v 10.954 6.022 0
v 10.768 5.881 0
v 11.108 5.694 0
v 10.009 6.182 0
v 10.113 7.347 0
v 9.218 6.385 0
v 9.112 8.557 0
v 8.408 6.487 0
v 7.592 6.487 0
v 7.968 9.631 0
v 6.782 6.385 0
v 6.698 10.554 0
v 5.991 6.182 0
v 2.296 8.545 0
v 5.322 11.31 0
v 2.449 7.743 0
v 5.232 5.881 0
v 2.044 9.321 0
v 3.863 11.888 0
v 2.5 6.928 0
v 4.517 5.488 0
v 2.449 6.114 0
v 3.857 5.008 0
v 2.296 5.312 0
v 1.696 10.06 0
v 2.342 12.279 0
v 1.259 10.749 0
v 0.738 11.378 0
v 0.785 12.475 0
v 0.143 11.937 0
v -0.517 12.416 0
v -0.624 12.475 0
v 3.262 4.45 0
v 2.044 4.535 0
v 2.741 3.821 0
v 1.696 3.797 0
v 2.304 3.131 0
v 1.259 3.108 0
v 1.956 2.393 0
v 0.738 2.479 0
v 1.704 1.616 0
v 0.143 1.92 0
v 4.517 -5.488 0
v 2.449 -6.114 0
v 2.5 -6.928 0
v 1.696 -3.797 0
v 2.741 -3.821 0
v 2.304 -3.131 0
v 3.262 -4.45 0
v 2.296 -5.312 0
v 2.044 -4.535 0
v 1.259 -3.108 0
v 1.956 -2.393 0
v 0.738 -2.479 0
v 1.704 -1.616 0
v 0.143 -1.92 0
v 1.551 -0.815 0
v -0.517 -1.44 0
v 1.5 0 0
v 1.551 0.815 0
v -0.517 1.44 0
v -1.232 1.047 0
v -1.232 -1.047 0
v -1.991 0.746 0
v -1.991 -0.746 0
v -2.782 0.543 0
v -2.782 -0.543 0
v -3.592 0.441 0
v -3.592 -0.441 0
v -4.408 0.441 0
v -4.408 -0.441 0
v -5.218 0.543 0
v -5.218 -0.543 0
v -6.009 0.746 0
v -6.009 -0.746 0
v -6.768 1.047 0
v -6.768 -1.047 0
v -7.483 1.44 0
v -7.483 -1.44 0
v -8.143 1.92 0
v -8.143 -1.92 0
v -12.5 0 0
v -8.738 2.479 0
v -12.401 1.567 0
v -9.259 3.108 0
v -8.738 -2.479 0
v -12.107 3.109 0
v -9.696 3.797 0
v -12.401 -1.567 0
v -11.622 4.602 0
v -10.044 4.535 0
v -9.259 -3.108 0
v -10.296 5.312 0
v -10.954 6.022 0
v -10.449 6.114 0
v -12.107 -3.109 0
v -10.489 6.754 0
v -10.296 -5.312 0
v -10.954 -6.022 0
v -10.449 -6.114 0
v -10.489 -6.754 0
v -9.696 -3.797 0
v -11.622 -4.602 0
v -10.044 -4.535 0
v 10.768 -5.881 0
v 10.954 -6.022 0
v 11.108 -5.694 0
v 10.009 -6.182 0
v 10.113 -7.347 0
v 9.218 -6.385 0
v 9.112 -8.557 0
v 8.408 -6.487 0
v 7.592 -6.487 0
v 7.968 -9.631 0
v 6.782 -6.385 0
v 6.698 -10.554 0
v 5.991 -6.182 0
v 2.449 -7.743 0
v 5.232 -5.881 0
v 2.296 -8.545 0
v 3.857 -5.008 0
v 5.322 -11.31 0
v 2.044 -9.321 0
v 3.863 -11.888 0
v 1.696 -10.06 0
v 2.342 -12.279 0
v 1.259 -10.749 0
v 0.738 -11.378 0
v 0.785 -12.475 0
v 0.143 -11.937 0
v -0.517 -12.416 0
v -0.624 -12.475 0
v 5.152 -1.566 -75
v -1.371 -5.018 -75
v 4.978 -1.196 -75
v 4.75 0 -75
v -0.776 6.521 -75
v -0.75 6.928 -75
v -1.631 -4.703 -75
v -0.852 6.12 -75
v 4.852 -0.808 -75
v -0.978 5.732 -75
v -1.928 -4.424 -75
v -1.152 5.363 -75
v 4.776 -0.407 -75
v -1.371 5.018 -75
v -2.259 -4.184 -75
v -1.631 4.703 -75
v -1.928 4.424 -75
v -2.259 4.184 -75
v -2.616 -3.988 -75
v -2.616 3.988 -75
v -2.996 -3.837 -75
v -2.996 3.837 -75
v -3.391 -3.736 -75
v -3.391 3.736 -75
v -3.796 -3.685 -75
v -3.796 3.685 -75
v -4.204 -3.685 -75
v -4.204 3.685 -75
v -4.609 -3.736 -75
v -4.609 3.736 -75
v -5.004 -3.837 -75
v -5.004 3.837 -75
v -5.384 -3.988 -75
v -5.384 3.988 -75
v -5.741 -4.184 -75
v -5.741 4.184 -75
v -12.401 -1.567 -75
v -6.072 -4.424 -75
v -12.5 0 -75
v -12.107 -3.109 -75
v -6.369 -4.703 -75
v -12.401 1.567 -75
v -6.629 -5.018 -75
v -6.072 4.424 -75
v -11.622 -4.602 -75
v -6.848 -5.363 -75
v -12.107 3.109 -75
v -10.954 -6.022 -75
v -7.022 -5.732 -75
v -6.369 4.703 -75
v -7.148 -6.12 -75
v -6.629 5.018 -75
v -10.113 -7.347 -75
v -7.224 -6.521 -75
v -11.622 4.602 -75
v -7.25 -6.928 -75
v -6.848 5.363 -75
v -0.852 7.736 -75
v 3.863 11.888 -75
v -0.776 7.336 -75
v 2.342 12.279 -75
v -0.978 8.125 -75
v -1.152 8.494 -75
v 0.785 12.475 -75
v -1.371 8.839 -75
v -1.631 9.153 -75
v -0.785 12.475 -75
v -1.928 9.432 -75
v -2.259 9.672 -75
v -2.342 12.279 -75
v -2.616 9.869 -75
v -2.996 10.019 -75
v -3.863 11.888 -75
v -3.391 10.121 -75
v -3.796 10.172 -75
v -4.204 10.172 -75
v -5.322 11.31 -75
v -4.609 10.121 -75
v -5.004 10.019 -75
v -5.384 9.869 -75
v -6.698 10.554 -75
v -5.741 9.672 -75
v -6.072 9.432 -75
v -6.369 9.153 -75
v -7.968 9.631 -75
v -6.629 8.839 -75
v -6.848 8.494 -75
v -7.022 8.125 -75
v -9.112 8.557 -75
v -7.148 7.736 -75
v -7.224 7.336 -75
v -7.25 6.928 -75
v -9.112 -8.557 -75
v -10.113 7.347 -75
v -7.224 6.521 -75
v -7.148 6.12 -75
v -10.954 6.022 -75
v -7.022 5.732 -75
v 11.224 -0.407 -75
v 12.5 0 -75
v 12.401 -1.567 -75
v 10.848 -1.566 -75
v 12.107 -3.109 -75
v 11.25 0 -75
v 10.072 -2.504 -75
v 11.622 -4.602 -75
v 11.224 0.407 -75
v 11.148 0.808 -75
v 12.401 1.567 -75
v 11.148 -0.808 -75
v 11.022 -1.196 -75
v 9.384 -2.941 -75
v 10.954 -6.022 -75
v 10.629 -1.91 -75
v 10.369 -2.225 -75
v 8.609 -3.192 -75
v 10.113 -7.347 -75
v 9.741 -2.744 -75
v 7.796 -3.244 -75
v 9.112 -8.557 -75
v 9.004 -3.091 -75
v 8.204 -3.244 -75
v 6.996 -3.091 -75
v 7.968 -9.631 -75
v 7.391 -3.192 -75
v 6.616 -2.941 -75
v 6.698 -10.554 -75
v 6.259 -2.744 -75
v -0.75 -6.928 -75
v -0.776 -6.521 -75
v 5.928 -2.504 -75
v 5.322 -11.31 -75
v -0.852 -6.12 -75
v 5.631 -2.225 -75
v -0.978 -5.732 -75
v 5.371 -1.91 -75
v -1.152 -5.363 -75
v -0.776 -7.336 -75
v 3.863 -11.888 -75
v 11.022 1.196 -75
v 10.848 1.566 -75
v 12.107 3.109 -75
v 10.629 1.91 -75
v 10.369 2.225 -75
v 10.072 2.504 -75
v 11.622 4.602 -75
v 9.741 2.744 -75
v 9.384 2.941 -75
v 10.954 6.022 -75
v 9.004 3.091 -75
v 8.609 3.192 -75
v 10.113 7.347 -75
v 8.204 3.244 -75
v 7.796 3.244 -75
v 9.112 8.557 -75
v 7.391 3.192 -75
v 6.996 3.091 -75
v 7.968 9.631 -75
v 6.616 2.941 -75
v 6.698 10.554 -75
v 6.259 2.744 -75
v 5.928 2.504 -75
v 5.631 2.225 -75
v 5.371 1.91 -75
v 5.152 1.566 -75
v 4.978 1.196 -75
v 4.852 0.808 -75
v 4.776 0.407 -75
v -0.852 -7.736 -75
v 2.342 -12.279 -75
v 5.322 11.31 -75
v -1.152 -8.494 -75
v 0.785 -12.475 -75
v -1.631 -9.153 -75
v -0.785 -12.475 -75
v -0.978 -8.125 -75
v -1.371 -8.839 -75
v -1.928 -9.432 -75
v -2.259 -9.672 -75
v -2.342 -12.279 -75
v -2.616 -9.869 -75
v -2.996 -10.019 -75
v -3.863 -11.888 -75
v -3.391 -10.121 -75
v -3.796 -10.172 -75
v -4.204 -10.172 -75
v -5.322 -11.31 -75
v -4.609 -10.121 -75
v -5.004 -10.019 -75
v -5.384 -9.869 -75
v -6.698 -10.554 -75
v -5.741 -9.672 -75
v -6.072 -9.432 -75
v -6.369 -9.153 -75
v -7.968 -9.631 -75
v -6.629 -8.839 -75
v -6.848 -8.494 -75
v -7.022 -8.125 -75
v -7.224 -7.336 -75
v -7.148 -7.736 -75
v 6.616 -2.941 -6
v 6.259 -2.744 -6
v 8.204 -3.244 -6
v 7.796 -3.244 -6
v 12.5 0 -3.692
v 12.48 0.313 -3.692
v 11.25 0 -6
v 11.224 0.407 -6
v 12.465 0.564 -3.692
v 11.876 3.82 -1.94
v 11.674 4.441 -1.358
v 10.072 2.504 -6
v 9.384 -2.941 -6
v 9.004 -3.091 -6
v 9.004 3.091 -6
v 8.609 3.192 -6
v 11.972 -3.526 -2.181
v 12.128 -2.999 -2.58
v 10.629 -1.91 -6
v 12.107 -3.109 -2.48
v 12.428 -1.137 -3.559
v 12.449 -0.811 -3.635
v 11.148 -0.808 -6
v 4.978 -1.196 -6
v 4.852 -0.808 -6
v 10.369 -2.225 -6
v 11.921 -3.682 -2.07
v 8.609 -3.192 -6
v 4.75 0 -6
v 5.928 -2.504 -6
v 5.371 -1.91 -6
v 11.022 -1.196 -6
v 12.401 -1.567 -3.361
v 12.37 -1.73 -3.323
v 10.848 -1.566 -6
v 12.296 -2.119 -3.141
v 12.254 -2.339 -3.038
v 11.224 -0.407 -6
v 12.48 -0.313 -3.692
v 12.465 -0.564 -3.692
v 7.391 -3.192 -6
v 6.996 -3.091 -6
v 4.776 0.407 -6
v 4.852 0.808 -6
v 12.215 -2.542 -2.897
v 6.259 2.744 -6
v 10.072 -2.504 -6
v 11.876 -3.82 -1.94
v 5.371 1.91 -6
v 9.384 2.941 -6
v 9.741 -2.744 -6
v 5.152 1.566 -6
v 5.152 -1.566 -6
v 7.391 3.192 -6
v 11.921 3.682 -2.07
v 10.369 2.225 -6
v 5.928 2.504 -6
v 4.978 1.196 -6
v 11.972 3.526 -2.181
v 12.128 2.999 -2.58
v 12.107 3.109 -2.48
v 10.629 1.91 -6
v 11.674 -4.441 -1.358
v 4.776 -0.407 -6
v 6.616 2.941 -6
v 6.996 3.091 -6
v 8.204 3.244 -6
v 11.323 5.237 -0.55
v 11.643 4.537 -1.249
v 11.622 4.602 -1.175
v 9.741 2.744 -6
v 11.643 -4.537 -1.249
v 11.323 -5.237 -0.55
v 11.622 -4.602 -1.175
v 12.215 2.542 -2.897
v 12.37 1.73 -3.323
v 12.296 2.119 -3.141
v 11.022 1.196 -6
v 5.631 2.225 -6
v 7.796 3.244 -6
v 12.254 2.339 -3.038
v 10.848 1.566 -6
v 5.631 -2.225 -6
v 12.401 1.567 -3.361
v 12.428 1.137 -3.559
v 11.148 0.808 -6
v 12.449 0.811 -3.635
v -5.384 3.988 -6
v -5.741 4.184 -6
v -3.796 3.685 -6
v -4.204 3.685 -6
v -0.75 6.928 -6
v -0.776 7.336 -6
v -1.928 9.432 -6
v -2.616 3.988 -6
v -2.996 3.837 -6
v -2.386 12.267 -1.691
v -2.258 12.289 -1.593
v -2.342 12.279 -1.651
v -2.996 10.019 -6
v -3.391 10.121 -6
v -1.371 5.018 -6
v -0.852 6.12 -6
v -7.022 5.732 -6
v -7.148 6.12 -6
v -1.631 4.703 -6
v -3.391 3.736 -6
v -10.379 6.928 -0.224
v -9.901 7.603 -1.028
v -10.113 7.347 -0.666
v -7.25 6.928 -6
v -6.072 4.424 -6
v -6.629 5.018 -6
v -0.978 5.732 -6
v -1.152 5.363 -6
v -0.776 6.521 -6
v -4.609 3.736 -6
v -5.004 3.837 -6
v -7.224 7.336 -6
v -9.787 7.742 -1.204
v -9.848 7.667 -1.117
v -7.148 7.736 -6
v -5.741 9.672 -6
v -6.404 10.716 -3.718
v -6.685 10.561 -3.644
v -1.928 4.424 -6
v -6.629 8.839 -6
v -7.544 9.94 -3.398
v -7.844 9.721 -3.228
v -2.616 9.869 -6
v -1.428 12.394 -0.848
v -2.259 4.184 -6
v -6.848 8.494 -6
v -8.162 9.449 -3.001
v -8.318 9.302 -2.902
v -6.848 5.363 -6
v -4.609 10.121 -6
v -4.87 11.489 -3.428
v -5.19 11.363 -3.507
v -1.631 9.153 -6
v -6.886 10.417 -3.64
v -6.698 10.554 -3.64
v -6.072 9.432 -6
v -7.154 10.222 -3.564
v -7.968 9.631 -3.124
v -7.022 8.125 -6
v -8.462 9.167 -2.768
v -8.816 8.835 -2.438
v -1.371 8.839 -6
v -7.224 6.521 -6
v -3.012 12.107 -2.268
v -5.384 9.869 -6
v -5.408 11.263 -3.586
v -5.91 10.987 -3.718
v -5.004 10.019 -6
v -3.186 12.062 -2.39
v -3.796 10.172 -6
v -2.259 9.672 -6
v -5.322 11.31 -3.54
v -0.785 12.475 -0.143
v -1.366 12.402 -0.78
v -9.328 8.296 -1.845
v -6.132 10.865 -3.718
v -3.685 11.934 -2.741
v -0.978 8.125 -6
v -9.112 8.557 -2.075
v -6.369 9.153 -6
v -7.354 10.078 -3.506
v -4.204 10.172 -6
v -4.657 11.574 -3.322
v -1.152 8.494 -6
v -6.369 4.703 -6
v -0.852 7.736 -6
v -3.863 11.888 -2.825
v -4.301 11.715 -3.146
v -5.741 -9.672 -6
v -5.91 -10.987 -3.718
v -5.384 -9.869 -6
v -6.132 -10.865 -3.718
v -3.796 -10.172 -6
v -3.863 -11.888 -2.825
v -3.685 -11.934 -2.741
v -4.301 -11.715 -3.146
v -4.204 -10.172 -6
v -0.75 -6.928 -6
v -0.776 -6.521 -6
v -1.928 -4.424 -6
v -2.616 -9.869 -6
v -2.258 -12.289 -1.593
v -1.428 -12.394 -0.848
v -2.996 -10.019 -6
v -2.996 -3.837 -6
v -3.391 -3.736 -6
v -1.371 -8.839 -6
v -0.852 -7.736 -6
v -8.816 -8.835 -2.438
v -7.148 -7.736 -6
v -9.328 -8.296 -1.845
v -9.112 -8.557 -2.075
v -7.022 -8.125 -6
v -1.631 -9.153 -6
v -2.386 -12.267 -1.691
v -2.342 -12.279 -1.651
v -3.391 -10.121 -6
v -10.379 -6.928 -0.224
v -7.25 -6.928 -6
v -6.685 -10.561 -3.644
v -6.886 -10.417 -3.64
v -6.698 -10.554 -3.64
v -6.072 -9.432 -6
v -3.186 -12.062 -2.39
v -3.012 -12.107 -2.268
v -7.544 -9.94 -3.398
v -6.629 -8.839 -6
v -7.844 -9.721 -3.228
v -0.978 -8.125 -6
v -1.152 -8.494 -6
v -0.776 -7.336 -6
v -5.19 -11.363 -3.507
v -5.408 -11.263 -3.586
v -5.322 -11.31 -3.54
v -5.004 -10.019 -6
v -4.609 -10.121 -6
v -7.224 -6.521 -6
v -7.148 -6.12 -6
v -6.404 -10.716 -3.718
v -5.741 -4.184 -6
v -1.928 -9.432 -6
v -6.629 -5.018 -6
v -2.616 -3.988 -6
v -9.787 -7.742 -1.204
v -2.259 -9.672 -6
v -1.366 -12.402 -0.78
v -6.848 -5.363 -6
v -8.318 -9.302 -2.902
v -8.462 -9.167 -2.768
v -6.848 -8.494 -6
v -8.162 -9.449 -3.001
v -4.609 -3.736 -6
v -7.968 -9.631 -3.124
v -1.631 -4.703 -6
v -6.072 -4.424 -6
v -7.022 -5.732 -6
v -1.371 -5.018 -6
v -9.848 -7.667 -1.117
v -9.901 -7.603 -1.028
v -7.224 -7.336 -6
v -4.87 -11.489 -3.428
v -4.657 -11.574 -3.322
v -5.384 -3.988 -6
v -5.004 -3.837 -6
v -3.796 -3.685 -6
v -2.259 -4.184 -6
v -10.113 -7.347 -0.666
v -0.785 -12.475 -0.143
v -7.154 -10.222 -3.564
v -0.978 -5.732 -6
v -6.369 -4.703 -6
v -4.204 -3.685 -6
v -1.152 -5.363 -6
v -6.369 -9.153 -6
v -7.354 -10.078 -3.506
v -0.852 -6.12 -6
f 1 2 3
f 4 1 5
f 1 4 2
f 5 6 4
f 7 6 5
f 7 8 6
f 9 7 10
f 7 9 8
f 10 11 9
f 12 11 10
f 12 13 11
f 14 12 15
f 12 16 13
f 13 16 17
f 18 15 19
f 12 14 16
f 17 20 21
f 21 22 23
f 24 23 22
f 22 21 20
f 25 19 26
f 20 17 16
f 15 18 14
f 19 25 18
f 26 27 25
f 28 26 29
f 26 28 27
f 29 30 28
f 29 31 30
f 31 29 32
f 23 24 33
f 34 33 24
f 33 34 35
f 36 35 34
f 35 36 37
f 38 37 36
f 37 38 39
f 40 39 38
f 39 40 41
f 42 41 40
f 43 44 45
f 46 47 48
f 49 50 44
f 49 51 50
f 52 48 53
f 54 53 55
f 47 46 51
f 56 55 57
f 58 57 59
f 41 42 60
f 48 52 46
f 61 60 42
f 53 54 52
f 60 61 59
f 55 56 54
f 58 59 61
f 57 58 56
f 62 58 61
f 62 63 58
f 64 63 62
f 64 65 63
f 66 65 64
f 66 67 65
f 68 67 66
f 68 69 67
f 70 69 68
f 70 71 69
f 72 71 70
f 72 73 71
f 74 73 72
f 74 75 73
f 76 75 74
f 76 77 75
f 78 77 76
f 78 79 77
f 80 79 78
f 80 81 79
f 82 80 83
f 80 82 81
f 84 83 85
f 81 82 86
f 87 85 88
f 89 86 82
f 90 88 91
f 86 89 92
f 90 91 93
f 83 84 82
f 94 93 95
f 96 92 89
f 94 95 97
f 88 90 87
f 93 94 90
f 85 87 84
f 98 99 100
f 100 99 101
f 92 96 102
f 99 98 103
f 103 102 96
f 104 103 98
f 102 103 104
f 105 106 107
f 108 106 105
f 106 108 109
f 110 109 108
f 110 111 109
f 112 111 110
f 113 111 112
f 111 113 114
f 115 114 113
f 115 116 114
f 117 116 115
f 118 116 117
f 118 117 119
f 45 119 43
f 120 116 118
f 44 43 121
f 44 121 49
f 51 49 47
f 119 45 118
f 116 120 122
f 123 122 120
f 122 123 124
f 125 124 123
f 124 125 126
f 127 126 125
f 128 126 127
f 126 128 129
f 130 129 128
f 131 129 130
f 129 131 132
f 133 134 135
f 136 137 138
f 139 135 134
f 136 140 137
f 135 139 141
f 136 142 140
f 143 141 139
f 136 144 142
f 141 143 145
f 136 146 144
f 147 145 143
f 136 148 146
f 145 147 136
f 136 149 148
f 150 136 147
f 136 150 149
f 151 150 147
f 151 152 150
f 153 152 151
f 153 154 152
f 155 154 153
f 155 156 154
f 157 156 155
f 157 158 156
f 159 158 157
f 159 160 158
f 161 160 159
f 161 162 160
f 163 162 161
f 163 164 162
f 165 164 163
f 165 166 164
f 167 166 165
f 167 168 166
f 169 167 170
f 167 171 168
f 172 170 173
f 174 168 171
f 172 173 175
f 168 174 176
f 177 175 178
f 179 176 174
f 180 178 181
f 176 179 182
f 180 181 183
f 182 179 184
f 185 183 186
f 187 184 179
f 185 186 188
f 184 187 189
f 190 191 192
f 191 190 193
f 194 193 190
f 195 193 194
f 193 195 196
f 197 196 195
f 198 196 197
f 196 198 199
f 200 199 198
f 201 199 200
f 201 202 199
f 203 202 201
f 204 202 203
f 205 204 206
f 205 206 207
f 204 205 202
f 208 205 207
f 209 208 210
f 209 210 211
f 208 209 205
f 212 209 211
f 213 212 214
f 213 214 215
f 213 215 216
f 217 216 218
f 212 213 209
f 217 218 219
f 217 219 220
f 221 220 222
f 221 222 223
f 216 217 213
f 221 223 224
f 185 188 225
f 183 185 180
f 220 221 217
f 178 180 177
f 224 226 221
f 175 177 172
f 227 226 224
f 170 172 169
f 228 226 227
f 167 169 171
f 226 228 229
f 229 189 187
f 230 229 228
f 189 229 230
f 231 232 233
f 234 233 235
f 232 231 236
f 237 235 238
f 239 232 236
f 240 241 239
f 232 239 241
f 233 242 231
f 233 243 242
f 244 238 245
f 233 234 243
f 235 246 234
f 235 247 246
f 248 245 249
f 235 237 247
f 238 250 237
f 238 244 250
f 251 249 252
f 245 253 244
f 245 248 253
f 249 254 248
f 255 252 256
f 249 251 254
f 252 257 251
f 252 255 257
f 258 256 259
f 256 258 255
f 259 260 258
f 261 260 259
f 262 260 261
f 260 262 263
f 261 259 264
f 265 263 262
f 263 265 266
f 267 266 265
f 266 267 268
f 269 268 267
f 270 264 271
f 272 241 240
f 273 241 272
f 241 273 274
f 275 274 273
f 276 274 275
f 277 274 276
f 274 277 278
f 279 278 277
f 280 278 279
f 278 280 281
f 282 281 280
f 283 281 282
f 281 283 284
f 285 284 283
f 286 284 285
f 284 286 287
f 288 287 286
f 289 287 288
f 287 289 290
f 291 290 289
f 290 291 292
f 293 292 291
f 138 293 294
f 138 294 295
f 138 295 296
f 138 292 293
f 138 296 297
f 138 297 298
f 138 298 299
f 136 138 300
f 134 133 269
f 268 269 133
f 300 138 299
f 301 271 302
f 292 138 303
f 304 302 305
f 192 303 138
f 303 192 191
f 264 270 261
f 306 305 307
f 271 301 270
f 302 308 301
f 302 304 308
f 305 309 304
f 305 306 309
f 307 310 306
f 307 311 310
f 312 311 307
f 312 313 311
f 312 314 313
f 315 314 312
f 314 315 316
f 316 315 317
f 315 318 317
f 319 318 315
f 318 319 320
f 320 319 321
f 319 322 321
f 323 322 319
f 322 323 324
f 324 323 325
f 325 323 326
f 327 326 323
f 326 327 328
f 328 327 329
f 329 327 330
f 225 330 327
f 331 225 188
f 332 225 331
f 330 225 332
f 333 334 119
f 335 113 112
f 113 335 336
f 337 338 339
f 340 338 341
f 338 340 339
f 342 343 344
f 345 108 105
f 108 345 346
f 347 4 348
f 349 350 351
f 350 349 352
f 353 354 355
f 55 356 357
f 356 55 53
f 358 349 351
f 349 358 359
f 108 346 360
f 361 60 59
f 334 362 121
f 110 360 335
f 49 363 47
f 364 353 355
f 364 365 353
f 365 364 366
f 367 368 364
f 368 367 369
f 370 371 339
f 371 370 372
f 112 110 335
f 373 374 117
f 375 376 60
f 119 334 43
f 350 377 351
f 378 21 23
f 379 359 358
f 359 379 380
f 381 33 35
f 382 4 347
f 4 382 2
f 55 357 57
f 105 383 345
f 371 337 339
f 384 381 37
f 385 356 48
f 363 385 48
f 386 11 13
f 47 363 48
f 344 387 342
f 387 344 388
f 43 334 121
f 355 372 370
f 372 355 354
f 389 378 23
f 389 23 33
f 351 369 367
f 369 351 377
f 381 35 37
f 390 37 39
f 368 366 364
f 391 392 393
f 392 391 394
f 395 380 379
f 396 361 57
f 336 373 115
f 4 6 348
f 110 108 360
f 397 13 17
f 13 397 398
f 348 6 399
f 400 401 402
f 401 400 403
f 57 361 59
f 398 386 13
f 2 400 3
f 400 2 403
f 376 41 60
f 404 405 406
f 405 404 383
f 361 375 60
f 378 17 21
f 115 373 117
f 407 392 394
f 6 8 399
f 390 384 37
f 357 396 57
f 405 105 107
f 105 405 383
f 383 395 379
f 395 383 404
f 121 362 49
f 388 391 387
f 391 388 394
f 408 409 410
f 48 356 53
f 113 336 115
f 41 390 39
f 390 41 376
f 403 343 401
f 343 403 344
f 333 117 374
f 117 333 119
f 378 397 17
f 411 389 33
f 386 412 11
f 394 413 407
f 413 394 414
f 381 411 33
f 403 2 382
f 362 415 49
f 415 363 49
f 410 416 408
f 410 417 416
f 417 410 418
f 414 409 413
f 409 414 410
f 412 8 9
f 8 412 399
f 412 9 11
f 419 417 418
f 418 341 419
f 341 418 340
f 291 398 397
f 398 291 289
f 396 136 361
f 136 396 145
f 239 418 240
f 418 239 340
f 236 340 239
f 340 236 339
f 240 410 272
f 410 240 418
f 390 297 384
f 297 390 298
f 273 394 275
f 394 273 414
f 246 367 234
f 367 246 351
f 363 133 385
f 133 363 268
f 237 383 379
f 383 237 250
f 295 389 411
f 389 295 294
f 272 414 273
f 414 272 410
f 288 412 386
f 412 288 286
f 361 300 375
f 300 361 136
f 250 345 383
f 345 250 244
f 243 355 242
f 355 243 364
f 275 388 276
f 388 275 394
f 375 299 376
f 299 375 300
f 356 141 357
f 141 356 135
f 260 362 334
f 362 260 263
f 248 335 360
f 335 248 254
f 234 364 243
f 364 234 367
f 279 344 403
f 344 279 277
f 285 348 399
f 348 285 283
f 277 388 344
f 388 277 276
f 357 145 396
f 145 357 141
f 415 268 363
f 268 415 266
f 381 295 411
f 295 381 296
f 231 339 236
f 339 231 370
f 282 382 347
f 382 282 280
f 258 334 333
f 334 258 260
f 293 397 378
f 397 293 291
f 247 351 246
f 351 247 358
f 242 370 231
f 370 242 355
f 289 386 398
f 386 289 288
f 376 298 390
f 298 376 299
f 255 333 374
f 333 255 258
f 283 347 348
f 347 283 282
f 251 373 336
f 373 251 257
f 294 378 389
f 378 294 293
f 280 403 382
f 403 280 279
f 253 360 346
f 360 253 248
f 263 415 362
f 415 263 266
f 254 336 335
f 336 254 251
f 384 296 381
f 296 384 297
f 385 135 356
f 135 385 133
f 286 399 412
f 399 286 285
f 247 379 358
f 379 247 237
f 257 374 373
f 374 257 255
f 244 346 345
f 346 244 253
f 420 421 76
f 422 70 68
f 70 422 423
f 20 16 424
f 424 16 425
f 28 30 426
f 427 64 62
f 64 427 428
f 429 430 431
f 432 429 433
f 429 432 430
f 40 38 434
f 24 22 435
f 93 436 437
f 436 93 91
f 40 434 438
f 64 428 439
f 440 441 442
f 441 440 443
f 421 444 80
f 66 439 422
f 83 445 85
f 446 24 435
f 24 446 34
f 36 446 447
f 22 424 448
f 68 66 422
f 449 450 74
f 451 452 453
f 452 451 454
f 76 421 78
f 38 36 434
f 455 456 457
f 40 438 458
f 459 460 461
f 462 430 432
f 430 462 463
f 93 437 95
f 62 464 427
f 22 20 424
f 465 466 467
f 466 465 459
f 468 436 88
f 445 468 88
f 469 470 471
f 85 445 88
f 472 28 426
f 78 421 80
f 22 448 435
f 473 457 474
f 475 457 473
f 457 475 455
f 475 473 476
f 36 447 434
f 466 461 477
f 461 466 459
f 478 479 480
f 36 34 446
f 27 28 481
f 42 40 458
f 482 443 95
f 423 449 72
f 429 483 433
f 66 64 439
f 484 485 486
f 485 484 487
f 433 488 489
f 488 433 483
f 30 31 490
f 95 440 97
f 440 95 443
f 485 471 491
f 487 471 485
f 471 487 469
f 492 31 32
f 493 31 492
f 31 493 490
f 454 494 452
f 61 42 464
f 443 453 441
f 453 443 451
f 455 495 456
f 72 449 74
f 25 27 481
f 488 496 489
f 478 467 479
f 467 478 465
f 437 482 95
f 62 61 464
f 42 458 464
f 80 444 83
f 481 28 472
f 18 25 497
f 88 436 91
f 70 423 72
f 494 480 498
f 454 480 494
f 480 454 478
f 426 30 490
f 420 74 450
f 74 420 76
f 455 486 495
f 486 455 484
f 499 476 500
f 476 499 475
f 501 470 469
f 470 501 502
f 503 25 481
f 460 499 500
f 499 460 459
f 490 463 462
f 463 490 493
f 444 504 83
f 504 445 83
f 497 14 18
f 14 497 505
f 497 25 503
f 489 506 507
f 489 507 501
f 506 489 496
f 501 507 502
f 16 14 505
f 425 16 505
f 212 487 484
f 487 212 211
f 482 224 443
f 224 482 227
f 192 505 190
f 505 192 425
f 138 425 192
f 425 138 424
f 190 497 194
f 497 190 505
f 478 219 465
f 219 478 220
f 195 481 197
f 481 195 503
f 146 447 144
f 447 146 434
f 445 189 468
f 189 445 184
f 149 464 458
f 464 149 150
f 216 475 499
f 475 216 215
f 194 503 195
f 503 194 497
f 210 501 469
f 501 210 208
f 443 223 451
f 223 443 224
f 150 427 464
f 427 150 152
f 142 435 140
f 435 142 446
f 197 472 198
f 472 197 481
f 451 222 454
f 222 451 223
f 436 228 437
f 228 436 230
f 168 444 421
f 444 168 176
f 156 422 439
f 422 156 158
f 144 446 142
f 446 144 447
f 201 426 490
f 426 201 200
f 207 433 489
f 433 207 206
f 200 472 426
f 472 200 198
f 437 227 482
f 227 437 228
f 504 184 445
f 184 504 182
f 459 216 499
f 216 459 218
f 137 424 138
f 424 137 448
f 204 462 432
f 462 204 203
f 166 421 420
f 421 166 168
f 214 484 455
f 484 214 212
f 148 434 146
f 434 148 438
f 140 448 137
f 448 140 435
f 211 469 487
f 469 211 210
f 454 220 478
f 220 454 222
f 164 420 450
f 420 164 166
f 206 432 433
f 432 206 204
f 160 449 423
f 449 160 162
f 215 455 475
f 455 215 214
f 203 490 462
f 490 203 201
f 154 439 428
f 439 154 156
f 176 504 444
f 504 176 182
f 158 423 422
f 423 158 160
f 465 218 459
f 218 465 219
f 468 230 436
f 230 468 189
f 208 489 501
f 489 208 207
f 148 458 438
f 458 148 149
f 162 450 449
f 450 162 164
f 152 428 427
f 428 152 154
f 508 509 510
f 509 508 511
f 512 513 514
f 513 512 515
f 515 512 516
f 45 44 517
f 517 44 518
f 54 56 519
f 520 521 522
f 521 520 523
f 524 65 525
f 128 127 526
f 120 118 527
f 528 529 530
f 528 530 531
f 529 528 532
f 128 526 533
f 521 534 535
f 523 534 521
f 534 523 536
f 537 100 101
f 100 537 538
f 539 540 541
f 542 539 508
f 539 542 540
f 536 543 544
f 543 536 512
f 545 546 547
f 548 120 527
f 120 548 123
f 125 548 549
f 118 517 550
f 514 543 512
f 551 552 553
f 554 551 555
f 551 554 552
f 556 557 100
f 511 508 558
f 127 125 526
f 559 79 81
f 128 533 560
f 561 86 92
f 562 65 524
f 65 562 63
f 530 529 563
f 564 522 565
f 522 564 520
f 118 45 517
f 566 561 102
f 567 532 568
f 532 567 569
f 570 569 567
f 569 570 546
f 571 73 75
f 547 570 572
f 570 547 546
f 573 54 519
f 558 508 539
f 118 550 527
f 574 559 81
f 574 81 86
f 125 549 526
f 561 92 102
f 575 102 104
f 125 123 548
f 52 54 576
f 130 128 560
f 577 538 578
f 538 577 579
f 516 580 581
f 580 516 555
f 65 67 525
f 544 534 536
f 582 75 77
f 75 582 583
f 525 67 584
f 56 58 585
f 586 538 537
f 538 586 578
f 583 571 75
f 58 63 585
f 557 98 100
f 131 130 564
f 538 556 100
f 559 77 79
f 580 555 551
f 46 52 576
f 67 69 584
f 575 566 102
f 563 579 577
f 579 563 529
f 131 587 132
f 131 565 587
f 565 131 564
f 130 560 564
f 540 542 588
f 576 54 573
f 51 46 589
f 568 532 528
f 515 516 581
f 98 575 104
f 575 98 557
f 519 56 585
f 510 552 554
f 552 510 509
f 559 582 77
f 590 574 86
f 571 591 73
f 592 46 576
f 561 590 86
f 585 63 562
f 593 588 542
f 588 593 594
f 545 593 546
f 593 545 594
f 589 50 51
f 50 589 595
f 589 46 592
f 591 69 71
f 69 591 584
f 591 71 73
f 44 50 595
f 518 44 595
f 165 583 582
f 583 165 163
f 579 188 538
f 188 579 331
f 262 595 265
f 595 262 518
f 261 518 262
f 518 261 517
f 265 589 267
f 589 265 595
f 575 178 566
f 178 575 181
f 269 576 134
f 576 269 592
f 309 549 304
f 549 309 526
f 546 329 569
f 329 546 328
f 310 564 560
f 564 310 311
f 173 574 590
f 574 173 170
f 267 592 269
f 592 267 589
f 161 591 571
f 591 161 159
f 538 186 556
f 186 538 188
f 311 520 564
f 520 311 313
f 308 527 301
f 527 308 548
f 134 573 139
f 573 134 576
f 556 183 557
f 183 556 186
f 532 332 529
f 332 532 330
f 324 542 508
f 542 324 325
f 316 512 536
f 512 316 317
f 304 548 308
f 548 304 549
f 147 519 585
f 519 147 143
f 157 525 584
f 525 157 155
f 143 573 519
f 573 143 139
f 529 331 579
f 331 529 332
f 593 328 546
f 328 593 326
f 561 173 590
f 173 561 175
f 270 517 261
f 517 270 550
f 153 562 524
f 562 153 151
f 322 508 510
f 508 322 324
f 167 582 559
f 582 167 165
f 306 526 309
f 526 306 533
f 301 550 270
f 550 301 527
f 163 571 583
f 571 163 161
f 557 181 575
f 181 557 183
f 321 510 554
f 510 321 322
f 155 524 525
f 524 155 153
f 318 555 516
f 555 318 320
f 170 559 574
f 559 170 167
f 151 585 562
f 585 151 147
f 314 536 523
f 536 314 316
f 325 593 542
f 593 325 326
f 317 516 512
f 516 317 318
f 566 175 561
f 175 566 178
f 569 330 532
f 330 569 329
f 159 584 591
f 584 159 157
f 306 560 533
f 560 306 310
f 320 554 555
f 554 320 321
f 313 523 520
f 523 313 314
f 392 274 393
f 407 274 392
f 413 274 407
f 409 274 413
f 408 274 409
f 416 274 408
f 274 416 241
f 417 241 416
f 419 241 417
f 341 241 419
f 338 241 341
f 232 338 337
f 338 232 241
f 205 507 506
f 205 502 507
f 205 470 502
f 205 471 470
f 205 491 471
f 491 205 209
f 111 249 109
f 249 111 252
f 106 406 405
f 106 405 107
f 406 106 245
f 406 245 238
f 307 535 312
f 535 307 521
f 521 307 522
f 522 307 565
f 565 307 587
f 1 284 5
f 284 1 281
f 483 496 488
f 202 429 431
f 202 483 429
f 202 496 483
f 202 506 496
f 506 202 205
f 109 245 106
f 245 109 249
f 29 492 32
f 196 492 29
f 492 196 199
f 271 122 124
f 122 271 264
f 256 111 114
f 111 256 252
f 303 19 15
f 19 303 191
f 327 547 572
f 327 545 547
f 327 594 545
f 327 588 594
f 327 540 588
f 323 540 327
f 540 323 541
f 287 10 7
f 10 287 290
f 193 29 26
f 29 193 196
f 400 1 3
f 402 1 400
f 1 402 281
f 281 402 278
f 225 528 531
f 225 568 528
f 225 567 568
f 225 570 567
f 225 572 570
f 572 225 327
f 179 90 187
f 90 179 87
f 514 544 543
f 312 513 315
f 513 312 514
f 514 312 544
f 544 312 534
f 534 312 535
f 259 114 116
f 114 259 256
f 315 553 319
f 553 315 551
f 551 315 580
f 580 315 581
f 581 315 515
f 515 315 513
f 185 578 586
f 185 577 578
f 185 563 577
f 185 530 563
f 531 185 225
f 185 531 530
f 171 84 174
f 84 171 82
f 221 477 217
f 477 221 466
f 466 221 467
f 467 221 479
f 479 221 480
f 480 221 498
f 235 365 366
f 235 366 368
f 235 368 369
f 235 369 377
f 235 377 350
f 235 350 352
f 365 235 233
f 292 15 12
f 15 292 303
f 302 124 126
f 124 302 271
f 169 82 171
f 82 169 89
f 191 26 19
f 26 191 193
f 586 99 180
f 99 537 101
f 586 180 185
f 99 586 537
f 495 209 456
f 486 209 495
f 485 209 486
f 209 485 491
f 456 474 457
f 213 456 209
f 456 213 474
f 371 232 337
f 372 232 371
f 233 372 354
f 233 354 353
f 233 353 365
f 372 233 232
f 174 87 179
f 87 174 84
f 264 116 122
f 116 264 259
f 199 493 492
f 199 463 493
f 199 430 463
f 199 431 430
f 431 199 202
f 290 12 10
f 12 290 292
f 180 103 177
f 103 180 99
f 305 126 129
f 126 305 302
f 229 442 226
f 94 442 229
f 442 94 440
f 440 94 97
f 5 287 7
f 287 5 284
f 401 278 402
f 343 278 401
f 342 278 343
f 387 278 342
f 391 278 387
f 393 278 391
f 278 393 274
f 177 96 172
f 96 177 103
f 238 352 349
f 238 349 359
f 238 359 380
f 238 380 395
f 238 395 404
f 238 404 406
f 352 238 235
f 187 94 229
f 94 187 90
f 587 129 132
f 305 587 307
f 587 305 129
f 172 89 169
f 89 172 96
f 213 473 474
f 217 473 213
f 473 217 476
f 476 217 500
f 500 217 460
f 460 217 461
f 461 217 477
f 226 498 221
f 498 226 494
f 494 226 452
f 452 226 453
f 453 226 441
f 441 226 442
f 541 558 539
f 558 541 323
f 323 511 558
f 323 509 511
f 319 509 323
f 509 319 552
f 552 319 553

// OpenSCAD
$fn = 50;


difference() {
	union() {
		translate(v = [0, 0, -75.0000000000]) {
			cylinder(h = 75, r = 12.5000000000);
		}
	}
	union() {
		translate(v = [8.0000000000, 0.0000000000, 0]) {
			rotate(a = [0, 0, 0]) {
				difference() {
					union() {
						#translate(v = [0, 0, -75.0000000000]) {
							cylinder(h = 75, r = 2.2500000000);
						}
						#translate(v = [0, 0, -6]) {
							cylinder(h = 6, r = 12.5000000000, r1 = 3.2500000000, r2 = 6.5000000000);
						}
						#translate(v = [0, 0, -75.0000000000]) {
							cylinder(h = 75, r = 3.2500000000);
						}
						#translate(v = [0, 0, -75.0000000000]) {
							cylinder(h = 75, r = 2.2500000000);
						}
					}
					union();
				}
			}
		}
		translate(v = [-4.0000000000, 6.9282032303, 0]) {
			rotate(a = [0, 0, 0]) {
				difference() {
					union() {
						#translate(v = [0, 0, -75.0000000000]) {
							cylinder(h = 75, r = 2.2500000000);
						}
						#translate(v = [0, 0, -6]) {
							cylinder(h = 6, r = 12.5000000000, r1 = 3.2500000000, r2 = 6.5000000000);
						}
						#translate(v = [0, 0, -75.0000000000]) {
							cylinder(h = 75, r = 3.2500000000);
						}
						#translate(v = [0, 0, -75.0000000000]) {
							cylinder(h = 75, r = 2.2500000000);
						}
					}
					union();
				}
			}
		}
		translate(v = [-4.0000000000, -6.9282032303, 0]) {
			rotate(a = [0, 0, 0]) {
				difference() {
					union() {
						#translate(v = [0, 0, -75.0000000000]) {
							cylinder(h = 75, r = 2.2500000000);
						}
						#translate(v = [0, 0, -6]) {
							cylinder(h = 6, r = 12.5000000000, r1 = 3.2500000000, r2 = 6.5000000000);
						}
						#translate(v = [0, 0, -75.0000000000]) {
							cylinder(h = 75, r = 3.2500000000);
						}
						#translate(v = [0, 0, -75.0000000000]) {
							cylinder(h = 75, r = 2.2500000000);
						}
					}
					union();
				}
			}
		}
	}
}
